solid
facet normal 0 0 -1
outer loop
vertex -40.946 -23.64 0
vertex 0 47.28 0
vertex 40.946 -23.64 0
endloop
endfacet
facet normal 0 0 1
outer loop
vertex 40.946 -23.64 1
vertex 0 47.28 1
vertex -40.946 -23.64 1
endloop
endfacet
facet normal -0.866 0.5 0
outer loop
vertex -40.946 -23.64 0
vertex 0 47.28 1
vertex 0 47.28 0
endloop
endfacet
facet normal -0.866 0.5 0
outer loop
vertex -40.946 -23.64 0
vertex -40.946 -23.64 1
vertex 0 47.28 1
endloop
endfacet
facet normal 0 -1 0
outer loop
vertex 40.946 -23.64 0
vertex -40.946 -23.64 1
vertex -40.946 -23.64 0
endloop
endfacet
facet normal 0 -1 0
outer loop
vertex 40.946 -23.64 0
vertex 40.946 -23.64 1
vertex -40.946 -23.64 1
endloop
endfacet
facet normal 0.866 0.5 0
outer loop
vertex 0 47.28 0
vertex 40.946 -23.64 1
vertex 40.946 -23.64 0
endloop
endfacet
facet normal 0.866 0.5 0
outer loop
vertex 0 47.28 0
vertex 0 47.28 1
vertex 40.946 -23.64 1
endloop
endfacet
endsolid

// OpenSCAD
// file: params.scad
// Glorb — shared parameters (include from other files)
// Units: millimeters
// Design OD ~12 in → R = 152.4 mm to outer diffuser face

RADIUS_MM = 152.4;

// Strut chords at RADIUS_MM (from mesh/edge_lengths.csv)
STRUT_SHORT = 83.292;
STRUT_LONG  = 94.188;

// Frame (no hub nodes) — faceplate rabbet
FACEPLATE_T = 1.0;       // flush pocket depth
RIM = 2.0;               // outer rim outside faceplate
LEDGE = 1.5;             // support under faceplate
STRUT_DEPTH = 8.0;       // frame thickness inward

// Hub / strut interface (legacy OpenSCAD struts — superseded by Frame_Channels)
STRUT_OD = 6.0;
STRUT_ID = 3.2;
HUB_SOCKET_DEPTH = 6.0;
HUB_BALL = 14.0;

// Light cup (optional alternate architecture)
CUP_WALL = 1.8;
CUP_DEPTH = 10.0;
CUP_FLOOR = 1.6;
LED_BORE = 5.2;
LED_WIRE_SLOT = 2.5;

// Diffuser / faceplate
DIFFUSER_T = FACEPLATE_T;
DIFFUSER_LIP = 0.4;

// Column / base / sphere sleeve
COLUMN_OD_IN = 22.0;     // section inside sphere (above ridge)
COLUMN_OD_BASE = 28.0;   // wider below ridge (mount stop)
COLUMN_ID = 16.0;
COLUMN_INTO_SPHERE = 50.8;  // 2.00 in
COLUMN_BELOW_RIDGE = 100.0;
SLEEVE_ID = 22.4;        // slip on COLUMN_OD_IN
SLEEVE_OD = 32.0;
SLEEVE_LEN = 40.0;
SLEEVE_FLANGE_OD = 36.0;
SLEEVE_FLANGE_T = 3.0;
BASE_D = 170.0;              // top outer OD (skirt); pack+DevKit+buck+stays+lip
BASE_FLOOR_T = 2.0;          // min floor thickness
BASE_SHELL_T = 5.0;          // lid thickness (column socket sits on this)
BASE_CLEAR_H = 44.45;        // 1.75 in interior clearance (battery-safe)
BASE_WALL_T = 5.0;           // BaseTop skirt wall
BASE_LIP_T = 2.5;            // BaseTub short register wall
BASE_LIP_H = 10.0;           // lip height top skirt slides over
BASE_SLIP = 0.4;             // diametral clearance top-ID vs lip-OD
BASE_H = BASE_FLOOR_T + BASE_CLEAR_H + BASE_SHELL_T;  // 51.45 mm overall
BASE_ID = BASE_D - 2 * BASE_WALL_T;  // top skirt ID (~160 mm)
BASE_LIP_OD = BASE_ID - BASE_SLIP;
BASE_BAY_ID = BASE_LIP_OD - 2 * BASE_LIP_T;  // clear inside tub lip

// Bay envelopes (mm) — leave air around; confirm on arrival
BATT_XYZ = [72, 57, 39];           // NYI 12V 6000mAh (2.83x2.26x1.52 in)
BATT_URL = "https://www.amazon.com/dp/B0FDVGB87N";
BATT_OUT_A = 3.0;                  // max continuous output (A)
// Charge with included 12.6V/2A supply only (not a plain 12V adapter)
BUCK_XYZ = [17.5, 12.3, 4.3];      // MP1584EN fixed 5V mini (Amazon B0B779ZYN1)
BUCK_URL = "https://www.amazon.com/dp/B0B779ZYN1";
// Common ESP32-WROOM DevKit (30-pin DOIT/clone ~51.5x28; DevKitC ~55x28 w/ antenna)
// Keep-out includes USB overhang + header height
ESP32_XYZ = [55, 30, 15];
ESP32_NOTE = "ESP32-WROOM DevKit class (home stock)";
JACK_HOLE_D = 12.0;                // panel barrel jack (charger / 12V in)
JACK_CENTER_Z = BASE_FLOOR_T + 20; // above lip — skirt opens into bay
// Base orientation: −Y = front (power switch), +Y = back (DC jack)

// DaierTek KCD1-5-101 round rocker (Amazon B07S1MV462) — snap-in Ø20 mm
SW_HOLE_D = 20.2;                  // print clearance on 20 mm mounting hole
SW_CBORE_D = 24.0;                 // underside counterbore (snap land)
SW_PANEL_T = 2.0;                  // remaining lid thickness at switch
SW_POS = [0, -50];                 // mm on BaseTop lid — front (−Y)
SW_URL = "https://www.amazon.com/dp/B07S1MV462";

// legacy alias
COLUMN_OD = COLUMN_OD_IN;
COLUMN_LEN = COLUMN_INTO_SPHERE + COLUMN_BELOW_RIDGE;
// main file
// Glorb — translucent diffuser plate for light cup
// Print in white / natural translucent PLA or PETG.

include <params.scad>

FACE_TYPE = "A";
SIDE_A = FACE_TYPE == "A" ? STRUT_SHORT : STRUT_SHORT;
SIDE_B = FACE_TYPE == "A" ? STRUT_SHORT : STRUT_SHORT;
SIDE_C = FACE_TYPE == "A" ? STRUT_SHORT : STRUT_LONG;

module triangle_plate(s1, s2, s3, h) {
    sp = (s1 + s2 + s3) / 2;
    area = sqrt(max(sp * (sp - s1) * (sp - s2) * (sp - s3), 0.001));
    ha = 2 * area / s1;
    x2 = (s1*s1 + s3*s3 - s2*s2) / (2 * s1);
    pts = [[0, 0], [s1, 0], [x2, ha]];
    cx = (pts[0][0] + pts[1][0] + pts[2][0]) / 3;
    cy = (pts[0][1] + pts[1][1] + pts[2][1]) / 3;
    linear_extrude(height=h)
        polygon([for (p = pts) [p[0] - cx, p[1] - cy]]);
}

// Slightly undersized vs cup lip recess
triangle_plate(SIDE_A - 1.4, SIDE_B - 1.4, SIDE_C - 1.4, DIFFUSER_T);
